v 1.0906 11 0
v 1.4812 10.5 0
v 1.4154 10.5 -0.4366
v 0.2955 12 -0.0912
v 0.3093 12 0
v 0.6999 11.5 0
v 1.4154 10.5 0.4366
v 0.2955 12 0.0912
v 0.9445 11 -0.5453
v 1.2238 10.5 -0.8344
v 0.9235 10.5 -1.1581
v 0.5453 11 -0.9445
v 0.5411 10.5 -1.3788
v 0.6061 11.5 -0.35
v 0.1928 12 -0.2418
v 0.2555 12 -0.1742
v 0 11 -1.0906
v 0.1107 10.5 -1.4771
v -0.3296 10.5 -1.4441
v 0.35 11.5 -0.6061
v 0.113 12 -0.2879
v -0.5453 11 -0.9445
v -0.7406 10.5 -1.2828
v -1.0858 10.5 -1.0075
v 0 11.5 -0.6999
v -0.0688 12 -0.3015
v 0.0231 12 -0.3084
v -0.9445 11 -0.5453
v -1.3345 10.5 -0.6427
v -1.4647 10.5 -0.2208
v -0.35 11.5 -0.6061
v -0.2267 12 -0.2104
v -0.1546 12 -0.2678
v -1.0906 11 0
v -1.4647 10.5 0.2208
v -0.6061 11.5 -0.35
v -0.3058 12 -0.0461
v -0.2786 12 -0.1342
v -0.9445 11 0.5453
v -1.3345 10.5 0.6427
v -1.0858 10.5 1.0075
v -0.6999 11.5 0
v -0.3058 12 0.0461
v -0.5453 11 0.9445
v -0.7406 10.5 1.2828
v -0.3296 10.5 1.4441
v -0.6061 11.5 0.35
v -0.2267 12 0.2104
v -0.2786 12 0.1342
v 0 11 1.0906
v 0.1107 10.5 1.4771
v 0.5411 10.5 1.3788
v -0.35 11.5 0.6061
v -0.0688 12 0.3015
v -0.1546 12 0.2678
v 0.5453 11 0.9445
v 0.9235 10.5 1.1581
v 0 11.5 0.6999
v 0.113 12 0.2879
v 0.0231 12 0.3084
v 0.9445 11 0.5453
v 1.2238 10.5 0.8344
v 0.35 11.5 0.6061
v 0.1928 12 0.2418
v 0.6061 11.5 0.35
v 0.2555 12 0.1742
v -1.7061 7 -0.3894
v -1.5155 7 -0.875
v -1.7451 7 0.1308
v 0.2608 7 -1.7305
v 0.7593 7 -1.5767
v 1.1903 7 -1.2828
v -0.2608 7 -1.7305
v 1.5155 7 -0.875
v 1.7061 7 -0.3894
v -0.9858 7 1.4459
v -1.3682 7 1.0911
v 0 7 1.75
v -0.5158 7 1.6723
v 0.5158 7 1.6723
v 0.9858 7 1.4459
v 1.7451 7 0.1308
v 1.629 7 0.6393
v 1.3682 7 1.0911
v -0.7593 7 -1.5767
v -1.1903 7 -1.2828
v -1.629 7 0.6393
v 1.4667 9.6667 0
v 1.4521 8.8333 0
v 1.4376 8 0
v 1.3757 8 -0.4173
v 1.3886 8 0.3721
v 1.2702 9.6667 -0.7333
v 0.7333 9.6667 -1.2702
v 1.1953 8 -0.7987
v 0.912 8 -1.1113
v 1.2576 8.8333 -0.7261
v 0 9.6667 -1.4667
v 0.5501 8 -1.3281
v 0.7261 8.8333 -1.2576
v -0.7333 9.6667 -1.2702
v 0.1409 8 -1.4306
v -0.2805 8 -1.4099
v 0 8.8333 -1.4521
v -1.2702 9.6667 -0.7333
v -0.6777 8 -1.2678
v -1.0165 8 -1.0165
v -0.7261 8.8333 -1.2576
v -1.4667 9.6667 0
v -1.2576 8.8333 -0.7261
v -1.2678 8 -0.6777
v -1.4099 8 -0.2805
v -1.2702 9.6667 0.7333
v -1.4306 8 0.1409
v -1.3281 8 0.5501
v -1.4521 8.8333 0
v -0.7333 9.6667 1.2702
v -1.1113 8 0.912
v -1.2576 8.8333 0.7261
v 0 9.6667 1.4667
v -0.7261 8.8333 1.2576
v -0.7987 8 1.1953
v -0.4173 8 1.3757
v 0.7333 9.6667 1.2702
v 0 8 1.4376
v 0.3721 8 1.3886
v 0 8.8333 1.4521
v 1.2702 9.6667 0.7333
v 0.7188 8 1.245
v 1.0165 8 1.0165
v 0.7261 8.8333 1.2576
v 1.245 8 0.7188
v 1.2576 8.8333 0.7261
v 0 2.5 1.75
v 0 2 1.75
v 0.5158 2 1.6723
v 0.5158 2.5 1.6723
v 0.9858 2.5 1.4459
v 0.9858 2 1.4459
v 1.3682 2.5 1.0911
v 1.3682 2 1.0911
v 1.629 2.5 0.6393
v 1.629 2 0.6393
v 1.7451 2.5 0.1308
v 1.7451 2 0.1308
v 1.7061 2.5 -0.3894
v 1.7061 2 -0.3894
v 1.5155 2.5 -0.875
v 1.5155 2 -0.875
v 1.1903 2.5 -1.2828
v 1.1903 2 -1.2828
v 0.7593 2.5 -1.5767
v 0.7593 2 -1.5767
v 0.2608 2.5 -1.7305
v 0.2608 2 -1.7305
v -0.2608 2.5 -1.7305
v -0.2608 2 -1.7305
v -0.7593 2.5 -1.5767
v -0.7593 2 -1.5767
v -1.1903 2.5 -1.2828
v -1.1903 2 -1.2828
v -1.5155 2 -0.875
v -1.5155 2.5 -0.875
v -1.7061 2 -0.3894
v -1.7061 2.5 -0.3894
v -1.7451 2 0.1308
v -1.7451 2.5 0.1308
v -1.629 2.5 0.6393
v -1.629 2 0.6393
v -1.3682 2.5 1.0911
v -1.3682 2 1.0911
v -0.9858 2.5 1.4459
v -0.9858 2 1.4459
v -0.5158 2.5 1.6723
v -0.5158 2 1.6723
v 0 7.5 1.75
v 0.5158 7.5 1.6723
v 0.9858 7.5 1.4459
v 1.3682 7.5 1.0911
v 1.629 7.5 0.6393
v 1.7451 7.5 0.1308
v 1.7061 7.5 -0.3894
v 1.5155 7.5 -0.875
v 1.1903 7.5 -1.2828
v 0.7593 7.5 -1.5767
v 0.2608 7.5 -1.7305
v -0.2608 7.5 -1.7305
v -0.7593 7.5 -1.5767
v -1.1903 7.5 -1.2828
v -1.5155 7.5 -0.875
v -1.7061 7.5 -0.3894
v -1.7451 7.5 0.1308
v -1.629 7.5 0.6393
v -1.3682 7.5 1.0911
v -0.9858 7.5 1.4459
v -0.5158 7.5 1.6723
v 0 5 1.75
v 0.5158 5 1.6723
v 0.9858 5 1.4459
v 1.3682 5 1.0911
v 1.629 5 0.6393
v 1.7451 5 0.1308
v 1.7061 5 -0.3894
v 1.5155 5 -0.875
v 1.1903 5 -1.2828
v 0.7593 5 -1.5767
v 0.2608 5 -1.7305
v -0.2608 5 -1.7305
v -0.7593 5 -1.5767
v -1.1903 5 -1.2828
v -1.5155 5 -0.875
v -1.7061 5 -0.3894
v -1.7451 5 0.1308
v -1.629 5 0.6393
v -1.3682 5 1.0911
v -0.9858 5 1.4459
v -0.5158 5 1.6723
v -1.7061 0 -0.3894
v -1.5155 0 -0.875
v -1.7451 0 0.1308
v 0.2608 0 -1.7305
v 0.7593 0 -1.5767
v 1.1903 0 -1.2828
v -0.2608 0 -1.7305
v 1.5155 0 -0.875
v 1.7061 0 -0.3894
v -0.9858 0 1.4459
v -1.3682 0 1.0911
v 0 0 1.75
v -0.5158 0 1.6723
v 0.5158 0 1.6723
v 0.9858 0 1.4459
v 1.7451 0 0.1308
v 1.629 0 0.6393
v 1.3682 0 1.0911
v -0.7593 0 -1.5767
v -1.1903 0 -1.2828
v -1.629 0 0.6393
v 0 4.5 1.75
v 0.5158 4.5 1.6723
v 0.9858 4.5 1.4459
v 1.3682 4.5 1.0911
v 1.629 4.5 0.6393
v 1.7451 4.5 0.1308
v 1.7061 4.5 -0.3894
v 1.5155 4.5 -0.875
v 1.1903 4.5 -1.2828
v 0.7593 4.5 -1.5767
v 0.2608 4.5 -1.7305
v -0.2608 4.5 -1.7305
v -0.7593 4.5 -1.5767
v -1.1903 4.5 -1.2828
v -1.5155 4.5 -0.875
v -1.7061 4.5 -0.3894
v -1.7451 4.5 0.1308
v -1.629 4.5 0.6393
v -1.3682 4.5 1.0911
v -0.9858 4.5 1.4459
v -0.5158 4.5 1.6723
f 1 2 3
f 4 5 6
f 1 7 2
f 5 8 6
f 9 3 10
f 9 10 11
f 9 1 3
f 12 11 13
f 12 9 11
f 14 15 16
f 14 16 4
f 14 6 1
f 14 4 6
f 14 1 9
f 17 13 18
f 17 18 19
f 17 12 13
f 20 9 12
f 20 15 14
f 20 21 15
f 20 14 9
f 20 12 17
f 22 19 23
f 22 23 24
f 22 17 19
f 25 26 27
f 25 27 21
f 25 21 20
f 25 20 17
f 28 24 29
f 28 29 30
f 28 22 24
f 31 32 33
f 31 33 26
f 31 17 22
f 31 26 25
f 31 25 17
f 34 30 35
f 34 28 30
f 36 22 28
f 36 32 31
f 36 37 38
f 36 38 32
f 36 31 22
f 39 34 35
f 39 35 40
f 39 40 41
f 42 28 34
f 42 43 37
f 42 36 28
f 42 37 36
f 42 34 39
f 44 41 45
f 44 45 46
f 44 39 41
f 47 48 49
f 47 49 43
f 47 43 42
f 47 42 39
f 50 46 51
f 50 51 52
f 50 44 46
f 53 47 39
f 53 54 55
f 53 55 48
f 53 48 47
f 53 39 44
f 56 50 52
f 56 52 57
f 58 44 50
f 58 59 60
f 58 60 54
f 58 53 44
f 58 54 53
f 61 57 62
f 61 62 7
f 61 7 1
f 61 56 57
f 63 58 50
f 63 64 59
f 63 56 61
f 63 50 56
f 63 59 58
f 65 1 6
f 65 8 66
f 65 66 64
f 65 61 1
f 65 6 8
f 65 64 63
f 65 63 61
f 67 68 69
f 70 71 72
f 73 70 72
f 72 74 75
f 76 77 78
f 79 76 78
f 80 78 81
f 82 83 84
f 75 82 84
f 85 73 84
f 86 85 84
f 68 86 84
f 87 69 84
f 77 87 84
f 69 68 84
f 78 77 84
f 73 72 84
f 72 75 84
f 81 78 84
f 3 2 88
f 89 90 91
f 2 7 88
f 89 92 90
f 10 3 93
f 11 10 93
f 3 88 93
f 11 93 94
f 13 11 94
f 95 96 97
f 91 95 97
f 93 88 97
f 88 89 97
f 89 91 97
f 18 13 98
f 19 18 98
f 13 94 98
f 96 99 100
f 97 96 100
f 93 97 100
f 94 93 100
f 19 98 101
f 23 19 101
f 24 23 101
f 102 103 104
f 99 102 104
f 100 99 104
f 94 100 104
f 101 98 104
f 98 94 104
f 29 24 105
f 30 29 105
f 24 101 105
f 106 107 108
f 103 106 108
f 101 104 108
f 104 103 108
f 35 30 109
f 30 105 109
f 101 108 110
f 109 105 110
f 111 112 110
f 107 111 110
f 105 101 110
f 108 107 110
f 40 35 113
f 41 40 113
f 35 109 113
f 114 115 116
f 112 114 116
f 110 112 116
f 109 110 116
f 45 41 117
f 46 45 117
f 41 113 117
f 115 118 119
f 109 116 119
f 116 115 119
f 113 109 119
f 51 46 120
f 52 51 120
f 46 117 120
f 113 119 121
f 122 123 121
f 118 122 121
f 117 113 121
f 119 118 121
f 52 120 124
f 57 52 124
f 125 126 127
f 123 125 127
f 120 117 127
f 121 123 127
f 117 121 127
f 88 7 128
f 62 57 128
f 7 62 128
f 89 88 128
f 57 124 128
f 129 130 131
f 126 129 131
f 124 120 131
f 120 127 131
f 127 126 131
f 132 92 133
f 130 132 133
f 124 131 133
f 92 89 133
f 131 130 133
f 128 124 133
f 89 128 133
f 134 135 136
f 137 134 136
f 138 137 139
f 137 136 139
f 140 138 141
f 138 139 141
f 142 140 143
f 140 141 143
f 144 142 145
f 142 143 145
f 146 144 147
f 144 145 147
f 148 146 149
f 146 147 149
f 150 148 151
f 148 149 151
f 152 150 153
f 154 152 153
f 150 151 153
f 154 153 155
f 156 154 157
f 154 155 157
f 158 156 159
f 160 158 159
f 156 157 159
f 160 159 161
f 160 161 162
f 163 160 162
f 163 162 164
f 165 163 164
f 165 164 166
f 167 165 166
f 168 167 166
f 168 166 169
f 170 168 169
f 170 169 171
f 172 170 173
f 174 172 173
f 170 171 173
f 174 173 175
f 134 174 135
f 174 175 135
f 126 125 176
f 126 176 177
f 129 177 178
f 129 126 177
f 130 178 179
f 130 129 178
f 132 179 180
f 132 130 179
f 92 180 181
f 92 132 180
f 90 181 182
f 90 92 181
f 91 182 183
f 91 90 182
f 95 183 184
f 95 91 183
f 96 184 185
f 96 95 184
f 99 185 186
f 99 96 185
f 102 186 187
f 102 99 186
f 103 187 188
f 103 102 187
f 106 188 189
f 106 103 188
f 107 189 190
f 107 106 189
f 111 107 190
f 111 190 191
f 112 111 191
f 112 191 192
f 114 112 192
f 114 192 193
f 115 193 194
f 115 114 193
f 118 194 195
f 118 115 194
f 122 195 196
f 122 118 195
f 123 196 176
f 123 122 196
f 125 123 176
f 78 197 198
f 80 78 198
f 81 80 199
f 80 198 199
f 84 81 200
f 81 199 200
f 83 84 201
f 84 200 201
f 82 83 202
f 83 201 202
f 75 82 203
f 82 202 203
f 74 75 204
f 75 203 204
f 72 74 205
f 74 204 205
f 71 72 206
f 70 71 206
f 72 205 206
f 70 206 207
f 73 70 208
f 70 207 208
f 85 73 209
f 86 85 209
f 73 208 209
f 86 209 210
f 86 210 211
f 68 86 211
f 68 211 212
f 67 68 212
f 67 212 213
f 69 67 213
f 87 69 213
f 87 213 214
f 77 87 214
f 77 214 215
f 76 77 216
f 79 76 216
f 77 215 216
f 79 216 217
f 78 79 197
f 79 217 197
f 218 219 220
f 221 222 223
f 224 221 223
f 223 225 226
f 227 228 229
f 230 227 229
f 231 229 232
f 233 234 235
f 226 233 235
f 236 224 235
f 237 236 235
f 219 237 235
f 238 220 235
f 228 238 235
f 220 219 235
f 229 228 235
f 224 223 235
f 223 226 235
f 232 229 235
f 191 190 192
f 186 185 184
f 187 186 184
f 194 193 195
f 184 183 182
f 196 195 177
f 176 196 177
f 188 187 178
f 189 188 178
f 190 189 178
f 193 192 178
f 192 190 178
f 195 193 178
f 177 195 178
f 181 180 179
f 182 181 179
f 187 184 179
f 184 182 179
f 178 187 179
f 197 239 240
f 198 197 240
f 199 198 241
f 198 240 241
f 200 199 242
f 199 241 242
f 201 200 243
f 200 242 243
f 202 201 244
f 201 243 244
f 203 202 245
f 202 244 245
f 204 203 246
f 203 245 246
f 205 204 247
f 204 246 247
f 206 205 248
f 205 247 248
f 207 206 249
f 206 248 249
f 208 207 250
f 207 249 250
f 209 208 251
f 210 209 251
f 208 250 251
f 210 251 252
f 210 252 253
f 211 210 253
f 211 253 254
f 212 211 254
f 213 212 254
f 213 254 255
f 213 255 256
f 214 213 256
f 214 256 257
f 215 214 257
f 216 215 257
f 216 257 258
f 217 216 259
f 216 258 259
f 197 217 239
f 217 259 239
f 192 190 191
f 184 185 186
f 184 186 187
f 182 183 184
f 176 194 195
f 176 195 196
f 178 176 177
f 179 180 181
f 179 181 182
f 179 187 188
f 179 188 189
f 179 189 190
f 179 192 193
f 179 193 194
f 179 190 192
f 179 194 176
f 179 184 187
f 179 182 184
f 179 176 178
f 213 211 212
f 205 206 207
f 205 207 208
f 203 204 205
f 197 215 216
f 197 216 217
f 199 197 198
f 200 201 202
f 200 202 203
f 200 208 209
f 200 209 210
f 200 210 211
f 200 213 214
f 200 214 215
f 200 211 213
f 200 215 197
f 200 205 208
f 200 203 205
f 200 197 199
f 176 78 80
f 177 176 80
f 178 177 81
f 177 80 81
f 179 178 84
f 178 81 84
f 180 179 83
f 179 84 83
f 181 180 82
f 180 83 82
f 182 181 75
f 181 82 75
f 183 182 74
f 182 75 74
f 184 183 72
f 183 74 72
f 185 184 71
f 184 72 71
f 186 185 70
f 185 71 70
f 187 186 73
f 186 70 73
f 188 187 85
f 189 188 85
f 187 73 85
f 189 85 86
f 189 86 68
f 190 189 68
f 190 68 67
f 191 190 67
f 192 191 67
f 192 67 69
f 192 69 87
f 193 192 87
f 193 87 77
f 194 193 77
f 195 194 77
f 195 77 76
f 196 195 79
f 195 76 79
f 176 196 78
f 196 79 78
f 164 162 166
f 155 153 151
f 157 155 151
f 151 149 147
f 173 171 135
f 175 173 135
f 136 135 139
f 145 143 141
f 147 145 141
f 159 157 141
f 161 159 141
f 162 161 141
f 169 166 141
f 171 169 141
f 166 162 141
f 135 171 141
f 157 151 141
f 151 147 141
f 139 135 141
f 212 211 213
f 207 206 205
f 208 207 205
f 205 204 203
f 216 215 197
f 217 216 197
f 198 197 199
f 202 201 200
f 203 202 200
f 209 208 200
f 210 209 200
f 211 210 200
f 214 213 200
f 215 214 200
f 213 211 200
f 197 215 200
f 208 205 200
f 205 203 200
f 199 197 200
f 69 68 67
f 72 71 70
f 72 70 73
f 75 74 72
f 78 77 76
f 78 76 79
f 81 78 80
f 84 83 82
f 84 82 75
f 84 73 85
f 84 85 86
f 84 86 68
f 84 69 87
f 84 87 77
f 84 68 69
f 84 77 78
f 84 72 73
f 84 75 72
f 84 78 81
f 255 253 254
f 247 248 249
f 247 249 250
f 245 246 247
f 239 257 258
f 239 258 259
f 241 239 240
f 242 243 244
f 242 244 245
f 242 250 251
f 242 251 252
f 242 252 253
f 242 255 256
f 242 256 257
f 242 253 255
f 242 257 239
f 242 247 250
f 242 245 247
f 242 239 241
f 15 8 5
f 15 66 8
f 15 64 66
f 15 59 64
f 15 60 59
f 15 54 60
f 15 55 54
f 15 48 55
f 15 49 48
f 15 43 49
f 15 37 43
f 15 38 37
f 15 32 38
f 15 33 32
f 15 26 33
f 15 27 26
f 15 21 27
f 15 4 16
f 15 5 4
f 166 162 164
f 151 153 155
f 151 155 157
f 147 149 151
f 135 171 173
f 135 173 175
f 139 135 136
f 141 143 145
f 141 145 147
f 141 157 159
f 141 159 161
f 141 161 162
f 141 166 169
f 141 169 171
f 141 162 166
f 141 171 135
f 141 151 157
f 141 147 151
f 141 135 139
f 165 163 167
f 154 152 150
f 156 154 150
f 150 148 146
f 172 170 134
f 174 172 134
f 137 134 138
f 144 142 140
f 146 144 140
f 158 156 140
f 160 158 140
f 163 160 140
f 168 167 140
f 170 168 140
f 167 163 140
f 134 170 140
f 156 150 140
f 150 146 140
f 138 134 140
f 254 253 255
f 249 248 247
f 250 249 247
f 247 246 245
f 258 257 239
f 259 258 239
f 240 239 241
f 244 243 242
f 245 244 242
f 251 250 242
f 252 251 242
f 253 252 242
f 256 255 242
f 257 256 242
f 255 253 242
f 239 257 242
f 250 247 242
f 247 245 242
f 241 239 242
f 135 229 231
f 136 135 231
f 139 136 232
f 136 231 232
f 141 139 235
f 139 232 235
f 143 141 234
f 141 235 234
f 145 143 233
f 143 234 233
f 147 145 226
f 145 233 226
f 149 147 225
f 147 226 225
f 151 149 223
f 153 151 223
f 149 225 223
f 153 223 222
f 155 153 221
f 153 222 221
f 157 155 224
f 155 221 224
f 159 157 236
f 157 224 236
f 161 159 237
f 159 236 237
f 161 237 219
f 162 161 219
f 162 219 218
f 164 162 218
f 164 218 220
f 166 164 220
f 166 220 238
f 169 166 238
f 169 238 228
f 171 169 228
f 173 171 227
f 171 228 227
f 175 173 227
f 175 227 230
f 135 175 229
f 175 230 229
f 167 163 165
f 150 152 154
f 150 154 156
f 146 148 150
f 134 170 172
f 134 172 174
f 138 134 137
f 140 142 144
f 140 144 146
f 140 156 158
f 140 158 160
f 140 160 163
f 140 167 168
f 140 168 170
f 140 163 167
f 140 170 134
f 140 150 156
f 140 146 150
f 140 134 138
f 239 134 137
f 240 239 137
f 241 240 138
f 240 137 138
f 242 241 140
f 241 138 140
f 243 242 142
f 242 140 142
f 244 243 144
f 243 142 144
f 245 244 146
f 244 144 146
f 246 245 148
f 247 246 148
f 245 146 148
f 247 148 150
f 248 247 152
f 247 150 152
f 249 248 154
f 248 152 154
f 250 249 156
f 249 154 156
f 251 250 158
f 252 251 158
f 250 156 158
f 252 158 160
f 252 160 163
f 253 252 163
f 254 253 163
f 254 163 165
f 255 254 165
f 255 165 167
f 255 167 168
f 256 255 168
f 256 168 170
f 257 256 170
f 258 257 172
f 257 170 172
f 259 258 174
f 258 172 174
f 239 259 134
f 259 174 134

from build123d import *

# Parameters (mm, degrees)
SKETCH1_R           = 1.75
BOSS_EXTRUDE1_DEPTH = 2
SKETCH2_R           = 1.75
BOSS_EXTRUDE2_DEPTH = 0.5
SKETCH3_R           = 1.75
BOSS_EXTRUDE3_DEPTH = 2
SKETCH4_R           = 1.75
BOSS_EXTRUDE4_DEPTH = 0.5
SKETCH5_R           = 1.75
BOSS_EXTRUDE5_DEPTH = 2
SKETCH7_R           = 1.75
BOSS_EXTRUDE6_DEPTH = 0.5
SKETCH8_R           = 1.75
BOSS_EXTRUDE7_DEPTH = 0.5
BOSS_EXTRUDE7_TAPER = 32
SKETCH9_R           = 1.437565324
BOSS_EXTRUDE8_DEPTH = 2.5
BOSS_EXTRUDE8_DRAFT = -1
SKETCH10_R          = 1.481202986
BOSS_EXTRUDE9_DEPTH = 1.5
BOSS_EXTRUDE9_TAPER = 38


with BuildPart() as part:
    # Sketch1 → Boss-Extrude1 (new body)
    with BuildSketch(Plane(origin=(0, 0, 0), x_dir=(1, 0, 0), z_dir=(0, 1, 0))):
        with Locations(Location((0, 0, 0), (0, 0, 270))):
            Circle(SKETCH1_R)
    extrude(amount=BOSS_EXTRUDE1_DEPTH)


with BuildPart() as body_2:
    # Sketch2 → Boss-Extrude2 (new body)
    with BuildSketch(Plane(origin=(0, 2, 0), x_dir=(1, 0, 0), z_dir=(0, 1, 0))):
        with Locations(Location((0, 0, 0), (0, 0, 270))):
            Circle(SKETCH2_R)
    extrude(amount=BOSS_EXTRUDE2_DEPTH)


with BuildPart() as body_3:
    # Sketch3 → Boss-Extrude3 (new body)
    with BuildSketch(Plane(origin=(0, 2.5, 0), x_dir=(1, 0, 0), z_dir=(0, 1, 0))):
        with Locations(Location((0, 0, 0), (0, 0, 270))):
            Circle(SKETCH3_R)
    extrude(amount=BOSS_EXTRUDE3_DEPTH)


with BuildPart() as body_4:
    # Sketch4 → Boss-Extrude4 (new body)
    with BuildSketch(Plane(origin=(0, 4.5, 0), x_dir=(1, 0, 0), z_dir=(0, 1, 0))):
        with Locations(Location((0, 0, 0), (0, 0, 270))):
            Circle(SKETCH4_R)
    extrude(amount=BOSS_EXTRUDE4_DEPTH)


with BuildPart() as body_5:
    # Sketch5 → Boss-Extrude5 (new body)
    with BuildSketch(Plane(origin=(0, 5, 0), x_dir=(1, 0, 0), z_dir=(0, 1, 0))):
        with Locations(Location((0, 0, 0), (0, 0, 270))):
            Circle(SKETCH5_R)
    extrude(amount=BOSS_EXTRUDE5_DEPTH)


with BuildPart() as body_6:
    # Sketch7 → Boss-Extrude6 (new body)
    with BuildSketch(Plane(origin=(0, 7, 0), x_dir=(1, 0, 0), z_dir=(0, 1, 0))):
        with Locations(Location((0, 0, 0), (0, 0, 270))):
            Circle(SKETCH7_R)
    extrude(amount=BOSS_EXTRUDE6_DEPTH)


with BuildPart() as body_7:
    # Sketch8 → Boss-Extrude7 (new body)
    with BuildSketch(Plane(origin=(0, 7.5, 0), x_dir=(1, 0, 0), z_dir=(0, 1, 0))):
        with Locations(Location((0, 0, 0), (0, 0, 270))):
            Circle(SKETCH8_R)
    extrude(amount=BOSS_EXTRUDE7_DEPTH, taper=BOSS_EXTRUDE7_TAPER)


with BuildPart() as boss_extrude8_tool:
    # Sketch9 → Boss-Extrude8 (with draft: the straight prism first)
    with BuildSketch(Plane(origin=(0, 8, 0), x_dir=(1, 0, 0), z_dir=(0, 1, 0))):
        Circle(SKETCH9_R)
    extrude(amount=BOSS_EXTRUDE8_DEPTH)
    # Boss-Extrude8: the draft: its side faces are tilted about the plane it starts from
    boss_extrude8_sides = [boss_extrude8_tool.faces().sort_by_distance(p)[0] for p in [
        (-1.437565324, 9.25, 0),
    ]]
    draft(boss_extrude8_sides, Plane(origin=(0, 8, 0), x_dir=(1, 0, 0), z_dir=(0, 1, 0)), BOSS_EXTRUDE8_DRAFT)


with BuildPart() as body_7_1:
    add(body_7.part)

    # Boss-Extrude8: add boss_extrude8_tool
    add(boss_extrude8_tool.part)

    # Sketch10 → Boss-Extrude9 (add)
    with BuildSketch(Plane(origin=(0, 10.5, 0), x_dir=(1, 0, 0), z_dir=(0, 1, 0))):
        Circle(SKETCH10_R)
    extrude(amount=BOSS_EXTRUDE9_DEPTH, taper=BOSS_EXTRUDE9_TAPER)


solid = Compound([part.part, body_2.part, body_3.part, body_4.part, body_5.part, body_6.part, body_7_1.part])
